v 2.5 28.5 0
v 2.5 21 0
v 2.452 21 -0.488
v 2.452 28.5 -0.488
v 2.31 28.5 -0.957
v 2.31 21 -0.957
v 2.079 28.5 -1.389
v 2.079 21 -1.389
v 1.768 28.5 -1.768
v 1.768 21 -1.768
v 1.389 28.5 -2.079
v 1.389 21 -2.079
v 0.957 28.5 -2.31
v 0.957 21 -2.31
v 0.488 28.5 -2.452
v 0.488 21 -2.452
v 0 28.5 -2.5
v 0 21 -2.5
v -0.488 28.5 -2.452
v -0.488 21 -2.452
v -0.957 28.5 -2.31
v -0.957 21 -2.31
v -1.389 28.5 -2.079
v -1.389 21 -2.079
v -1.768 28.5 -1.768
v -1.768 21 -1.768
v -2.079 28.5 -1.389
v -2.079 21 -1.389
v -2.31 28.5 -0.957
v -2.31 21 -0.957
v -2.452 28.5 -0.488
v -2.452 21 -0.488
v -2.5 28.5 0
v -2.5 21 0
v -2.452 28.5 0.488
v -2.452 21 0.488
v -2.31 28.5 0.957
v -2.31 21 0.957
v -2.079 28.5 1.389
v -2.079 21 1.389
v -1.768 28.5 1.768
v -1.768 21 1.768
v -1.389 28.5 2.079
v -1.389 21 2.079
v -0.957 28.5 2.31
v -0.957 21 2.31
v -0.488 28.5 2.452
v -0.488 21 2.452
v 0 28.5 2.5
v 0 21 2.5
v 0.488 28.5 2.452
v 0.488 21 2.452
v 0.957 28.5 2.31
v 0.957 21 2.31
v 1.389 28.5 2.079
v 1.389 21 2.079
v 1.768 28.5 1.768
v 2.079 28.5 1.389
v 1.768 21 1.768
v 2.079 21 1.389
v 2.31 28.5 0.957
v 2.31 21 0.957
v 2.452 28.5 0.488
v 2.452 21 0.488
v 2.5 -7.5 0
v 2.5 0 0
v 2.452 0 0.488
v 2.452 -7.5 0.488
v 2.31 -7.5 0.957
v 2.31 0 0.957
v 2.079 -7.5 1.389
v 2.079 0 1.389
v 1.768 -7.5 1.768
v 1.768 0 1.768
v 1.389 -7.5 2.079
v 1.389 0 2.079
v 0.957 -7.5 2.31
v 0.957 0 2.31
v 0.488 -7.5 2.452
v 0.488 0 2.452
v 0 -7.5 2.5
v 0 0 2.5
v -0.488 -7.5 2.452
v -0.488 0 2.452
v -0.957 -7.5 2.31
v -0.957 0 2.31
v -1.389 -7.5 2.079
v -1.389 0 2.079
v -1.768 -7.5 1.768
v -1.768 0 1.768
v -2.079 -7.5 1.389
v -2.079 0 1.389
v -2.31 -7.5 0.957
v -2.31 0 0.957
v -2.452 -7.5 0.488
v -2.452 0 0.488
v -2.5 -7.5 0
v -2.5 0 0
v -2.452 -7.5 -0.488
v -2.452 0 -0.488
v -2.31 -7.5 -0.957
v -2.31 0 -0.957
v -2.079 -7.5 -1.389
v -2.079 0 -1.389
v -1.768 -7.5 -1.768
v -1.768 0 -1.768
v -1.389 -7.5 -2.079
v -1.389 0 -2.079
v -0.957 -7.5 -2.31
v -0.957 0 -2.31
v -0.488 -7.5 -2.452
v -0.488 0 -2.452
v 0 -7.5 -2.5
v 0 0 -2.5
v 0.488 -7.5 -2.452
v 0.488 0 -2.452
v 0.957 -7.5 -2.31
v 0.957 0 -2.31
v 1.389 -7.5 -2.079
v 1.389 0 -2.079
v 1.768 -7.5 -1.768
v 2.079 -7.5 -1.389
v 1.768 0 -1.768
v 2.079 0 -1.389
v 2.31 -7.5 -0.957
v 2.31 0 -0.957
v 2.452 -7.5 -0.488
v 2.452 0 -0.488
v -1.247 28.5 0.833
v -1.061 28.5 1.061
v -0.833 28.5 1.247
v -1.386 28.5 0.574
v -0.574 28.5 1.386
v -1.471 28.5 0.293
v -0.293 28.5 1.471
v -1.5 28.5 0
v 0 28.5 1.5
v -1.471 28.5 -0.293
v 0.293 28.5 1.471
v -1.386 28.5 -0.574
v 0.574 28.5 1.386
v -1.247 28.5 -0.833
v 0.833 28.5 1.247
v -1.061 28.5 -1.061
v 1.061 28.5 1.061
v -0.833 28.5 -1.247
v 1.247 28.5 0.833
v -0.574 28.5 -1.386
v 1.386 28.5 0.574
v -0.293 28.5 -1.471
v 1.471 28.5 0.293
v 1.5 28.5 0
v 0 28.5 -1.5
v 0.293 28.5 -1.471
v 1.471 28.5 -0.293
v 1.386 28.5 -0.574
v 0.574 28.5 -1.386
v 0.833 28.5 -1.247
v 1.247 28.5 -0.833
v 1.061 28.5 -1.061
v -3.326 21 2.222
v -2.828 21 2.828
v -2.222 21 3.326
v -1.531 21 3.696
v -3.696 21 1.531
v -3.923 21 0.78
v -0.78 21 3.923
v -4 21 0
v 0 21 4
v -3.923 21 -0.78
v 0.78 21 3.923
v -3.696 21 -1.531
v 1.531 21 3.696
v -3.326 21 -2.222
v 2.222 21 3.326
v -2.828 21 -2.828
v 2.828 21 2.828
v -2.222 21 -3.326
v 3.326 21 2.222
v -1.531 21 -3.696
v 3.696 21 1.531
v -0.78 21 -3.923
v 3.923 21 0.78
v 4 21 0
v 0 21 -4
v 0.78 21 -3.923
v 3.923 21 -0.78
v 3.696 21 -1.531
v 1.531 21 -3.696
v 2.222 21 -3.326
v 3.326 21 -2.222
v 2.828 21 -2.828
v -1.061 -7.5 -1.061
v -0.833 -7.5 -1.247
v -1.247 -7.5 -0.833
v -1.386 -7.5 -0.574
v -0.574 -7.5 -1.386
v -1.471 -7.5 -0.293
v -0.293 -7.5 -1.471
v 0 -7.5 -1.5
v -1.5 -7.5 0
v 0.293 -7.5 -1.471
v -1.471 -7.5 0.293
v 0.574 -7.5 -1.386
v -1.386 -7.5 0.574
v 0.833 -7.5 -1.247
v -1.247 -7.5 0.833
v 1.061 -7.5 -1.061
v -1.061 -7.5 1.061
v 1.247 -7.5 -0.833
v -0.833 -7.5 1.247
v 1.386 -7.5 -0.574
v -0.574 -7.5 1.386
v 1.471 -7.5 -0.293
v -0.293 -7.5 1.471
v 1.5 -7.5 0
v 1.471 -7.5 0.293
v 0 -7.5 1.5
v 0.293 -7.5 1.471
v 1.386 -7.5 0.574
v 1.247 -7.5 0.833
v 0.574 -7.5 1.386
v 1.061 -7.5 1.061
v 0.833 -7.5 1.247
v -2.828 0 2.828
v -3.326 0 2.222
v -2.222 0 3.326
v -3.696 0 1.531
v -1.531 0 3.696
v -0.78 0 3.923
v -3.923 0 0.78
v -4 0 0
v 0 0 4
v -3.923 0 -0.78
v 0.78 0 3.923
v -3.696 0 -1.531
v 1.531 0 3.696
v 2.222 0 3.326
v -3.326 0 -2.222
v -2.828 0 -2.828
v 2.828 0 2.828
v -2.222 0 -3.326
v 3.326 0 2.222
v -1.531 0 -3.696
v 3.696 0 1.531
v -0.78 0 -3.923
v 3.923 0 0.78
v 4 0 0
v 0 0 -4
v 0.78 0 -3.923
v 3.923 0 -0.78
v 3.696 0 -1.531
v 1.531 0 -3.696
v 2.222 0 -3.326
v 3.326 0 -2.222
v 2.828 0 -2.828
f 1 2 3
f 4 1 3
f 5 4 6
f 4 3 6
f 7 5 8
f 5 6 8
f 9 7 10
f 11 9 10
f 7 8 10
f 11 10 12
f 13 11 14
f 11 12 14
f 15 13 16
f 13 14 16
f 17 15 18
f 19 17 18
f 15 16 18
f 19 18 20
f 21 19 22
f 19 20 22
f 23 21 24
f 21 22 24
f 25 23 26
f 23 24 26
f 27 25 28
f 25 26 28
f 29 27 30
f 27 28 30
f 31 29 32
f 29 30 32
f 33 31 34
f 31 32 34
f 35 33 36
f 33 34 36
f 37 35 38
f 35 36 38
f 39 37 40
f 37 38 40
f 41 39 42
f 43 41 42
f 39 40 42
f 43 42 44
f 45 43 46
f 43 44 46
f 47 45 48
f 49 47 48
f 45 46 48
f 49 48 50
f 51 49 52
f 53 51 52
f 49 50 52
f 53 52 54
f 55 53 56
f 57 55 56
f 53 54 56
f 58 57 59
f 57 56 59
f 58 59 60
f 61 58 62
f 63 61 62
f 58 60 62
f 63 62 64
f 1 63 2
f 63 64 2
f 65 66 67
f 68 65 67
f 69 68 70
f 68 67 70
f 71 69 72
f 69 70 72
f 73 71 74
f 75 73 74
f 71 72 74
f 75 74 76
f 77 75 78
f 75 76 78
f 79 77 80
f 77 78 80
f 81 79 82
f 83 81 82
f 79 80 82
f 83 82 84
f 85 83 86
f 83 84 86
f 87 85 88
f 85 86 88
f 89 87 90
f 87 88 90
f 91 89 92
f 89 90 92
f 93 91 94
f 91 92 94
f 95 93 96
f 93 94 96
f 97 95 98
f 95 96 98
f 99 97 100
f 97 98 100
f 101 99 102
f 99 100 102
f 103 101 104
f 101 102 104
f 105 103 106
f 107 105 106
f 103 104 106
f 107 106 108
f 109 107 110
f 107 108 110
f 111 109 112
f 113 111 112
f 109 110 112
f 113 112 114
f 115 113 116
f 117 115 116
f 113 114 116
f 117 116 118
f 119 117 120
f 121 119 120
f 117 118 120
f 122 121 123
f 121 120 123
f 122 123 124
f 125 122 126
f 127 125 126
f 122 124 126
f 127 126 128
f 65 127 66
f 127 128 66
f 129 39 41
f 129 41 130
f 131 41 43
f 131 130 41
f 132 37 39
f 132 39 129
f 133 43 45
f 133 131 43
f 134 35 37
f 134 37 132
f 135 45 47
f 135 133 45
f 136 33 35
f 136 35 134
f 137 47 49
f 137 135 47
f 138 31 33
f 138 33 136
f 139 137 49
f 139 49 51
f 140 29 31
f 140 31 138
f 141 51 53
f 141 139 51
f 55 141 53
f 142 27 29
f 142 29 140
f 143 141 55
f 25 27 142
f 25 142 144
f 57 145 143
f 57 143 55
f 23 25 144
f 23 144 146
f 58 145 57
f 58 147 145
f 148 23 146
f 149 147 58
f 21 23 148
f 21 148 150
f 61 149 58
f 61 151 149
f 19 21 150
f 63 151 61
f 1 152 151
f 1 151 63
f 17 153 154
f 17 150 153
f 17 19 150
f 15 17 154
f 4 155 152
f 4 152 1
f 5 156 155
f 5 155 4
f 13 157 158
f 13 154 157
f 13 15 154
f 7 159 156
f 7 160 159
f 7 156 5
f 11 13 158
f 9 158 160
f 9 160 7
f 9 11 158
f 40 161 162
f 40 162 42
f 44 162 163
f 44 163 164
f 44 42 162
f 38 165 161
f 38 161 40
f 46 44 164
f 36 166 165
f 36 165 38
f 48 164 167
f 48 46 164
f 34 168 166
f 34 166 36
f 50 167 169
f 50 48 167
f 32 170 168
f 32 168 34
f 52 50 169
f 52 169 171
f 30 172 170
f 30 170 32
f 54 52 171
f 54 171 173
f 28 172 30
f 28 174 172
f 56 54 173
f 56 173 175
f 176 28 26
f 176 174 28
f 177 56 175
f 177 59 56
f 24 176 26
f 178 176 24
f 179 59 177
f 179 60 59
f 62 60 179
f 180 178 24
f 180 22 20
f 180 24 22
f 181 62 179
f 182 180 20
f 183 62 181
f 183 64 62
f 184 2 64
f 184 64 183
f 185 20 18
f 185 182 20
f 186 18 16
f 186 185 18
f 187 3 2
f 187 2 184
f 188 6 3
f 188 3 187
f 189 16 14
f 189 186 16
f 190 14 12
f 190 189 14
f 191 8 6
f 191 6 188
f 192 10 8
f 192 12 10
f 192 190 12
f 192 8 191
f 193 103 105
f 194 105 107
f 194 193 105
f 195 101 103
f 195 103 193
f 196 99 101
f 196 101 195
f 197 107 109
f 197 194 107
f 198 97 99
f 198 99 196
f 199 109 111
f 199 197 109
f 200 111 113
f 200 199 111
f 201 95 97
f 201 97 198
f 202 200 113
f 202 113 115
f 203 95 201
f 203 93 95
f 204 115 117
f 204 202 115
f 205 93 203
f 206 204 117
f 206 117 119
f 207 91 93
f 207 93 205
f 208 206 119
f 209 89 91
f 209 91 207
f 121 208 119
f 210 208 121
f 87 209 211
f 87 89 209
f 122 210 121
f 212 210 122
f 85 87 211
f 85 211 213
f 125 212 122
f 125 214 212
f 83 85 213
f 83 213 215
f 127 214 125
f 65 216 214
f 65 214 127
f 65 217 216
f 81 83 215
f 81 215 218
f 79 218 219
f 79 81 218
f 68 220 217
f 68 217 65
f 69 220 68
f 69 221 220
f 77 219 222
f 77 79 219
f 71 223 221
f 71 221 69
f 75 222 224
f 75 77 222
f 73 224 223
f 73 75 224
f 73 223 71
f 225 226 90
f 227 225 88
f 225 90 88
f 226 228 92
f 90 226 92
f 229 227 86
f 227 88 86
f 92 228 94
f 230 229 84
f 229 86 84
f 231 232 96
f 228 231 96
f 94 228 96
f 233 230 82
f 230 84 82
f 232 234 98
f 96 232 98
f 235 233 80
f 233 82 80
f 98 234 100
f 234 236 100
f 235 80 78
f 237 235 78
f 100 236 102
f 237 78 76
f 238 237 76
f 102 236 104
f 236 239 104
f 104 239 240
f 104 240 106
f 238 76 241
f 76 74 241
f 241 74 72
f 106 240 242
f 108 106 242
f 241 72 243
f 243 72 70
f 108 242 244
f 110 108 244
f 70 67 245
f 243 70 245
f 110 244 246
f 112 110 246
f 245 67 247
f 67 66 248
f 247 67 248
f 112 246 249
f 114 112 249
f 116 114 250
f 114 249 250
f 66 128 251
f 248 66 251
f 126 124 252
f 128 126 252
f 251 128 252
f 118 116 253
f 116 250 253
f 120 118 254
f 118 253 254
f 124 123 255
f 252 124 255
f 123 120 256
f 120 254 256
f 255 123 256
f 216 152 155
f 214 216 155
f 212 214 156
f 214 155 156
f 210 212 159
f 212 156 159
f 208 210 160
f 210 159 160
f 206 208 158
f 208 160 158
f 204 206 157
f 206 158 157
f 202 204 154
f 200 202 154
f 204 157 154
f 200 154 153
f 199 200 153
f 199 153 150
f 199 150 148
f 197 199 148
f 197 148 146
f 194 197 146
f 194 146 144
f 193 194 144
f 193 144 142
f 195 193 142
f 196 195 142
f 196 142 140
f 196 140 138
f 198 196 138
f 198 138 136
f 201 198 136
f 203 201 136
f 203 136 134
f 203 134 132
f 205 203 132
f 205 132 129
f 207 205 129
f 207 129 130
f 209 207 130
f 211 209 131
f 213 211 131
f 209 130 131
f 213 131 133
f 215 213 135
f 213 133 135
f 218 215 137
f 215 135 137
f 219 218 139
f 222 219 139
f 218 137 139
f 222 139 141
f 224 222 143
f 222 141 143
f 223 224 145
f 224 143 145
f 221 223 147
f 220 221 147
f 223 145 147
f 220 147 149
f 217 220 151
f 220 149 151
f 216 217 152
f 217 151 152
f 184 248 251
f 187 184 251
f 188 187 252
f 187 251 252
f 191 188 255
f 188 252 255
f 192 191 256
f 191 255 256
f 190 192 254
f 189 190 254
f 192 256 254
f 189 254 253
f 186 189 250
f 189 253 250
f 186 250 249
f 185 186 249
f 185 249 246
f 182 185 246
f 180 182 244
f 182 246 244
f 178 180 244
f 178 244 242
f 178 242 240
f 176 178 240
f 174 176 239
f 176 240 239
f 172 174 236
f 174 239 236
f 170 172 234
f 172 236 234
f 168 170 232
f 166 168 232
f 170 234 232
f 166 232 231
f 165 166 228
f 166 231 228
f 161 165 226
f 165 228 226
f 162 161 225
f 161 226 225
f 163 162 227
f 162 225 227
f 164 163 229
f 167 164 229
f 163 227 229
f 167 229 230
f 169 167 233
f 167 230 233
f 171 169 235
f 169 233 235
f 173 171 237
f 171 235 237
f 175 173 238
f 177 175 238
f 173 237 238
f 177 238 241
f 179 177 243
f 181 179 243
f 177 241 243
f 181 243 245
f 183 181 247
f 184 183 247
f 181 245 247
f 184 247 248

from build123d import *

# Parameters (mm, degrees)
SKETCH1_R           = 4
SKETCH1_R_2         = 1.25
BOSS_EXTRUDE1_DEPTH = 21
SKETCH2_R           = 2.5
BOSS_EXTRUDE2_DEPTH = 7.5
SKETCH3_R           = 2.5
BOSS_EXTRUDE3_DEPTH = 7.5
SKETCH4_R           = 1.5
CUT_EXTRUDE1_DEPTH  = 37


with BuildPart() as part:
    # Sketch1 → Boss-Extrude1 (new body)
    with BuildSketch(Plane(origin=(0, 0, 0), x_dir=(1, 0, 0), z_dir=(0, 1, 0))):
        Circle(SKETCH1_R)
        Circle(SKETCH1_R_2, mode=Mode.SUBTRACT)
    extrude(amount=BOSS_EXTRUDE1_DEPTH)

    # Sketch2 → Boss-Extrude2 (add)
    with BuildSketch(Plane.XZ):
        Circle(SKETCH2_R)
    extrude(amount=BOSS_EXTRUDE2_DEPTH)

    # Sketch3 → Boss-Extrude3 (add)
    with BuildSketch(Plane(origin=(0, 21, 0), x_dir=(1, 0, 0), z_dir=(0, 1, 0))):
        Circle(SKETCH3_R)
    extrude(amount=BOSS_EXTRUDE3_DEPTH)

    # Sketch4 → Cut-Extrude1 (cut, through all)
    with BuildSketch(Plane(origin=(0, 28.5, 0), x_dir=(1, 0, 0), z_dir=(0, 1, 0))):
        Circle(SKETCH4_R)
    extrude(amount=-CUT_EXTRUDE1_DEPTH, mode=Mode.SUBTRACT)


solid = part.part
